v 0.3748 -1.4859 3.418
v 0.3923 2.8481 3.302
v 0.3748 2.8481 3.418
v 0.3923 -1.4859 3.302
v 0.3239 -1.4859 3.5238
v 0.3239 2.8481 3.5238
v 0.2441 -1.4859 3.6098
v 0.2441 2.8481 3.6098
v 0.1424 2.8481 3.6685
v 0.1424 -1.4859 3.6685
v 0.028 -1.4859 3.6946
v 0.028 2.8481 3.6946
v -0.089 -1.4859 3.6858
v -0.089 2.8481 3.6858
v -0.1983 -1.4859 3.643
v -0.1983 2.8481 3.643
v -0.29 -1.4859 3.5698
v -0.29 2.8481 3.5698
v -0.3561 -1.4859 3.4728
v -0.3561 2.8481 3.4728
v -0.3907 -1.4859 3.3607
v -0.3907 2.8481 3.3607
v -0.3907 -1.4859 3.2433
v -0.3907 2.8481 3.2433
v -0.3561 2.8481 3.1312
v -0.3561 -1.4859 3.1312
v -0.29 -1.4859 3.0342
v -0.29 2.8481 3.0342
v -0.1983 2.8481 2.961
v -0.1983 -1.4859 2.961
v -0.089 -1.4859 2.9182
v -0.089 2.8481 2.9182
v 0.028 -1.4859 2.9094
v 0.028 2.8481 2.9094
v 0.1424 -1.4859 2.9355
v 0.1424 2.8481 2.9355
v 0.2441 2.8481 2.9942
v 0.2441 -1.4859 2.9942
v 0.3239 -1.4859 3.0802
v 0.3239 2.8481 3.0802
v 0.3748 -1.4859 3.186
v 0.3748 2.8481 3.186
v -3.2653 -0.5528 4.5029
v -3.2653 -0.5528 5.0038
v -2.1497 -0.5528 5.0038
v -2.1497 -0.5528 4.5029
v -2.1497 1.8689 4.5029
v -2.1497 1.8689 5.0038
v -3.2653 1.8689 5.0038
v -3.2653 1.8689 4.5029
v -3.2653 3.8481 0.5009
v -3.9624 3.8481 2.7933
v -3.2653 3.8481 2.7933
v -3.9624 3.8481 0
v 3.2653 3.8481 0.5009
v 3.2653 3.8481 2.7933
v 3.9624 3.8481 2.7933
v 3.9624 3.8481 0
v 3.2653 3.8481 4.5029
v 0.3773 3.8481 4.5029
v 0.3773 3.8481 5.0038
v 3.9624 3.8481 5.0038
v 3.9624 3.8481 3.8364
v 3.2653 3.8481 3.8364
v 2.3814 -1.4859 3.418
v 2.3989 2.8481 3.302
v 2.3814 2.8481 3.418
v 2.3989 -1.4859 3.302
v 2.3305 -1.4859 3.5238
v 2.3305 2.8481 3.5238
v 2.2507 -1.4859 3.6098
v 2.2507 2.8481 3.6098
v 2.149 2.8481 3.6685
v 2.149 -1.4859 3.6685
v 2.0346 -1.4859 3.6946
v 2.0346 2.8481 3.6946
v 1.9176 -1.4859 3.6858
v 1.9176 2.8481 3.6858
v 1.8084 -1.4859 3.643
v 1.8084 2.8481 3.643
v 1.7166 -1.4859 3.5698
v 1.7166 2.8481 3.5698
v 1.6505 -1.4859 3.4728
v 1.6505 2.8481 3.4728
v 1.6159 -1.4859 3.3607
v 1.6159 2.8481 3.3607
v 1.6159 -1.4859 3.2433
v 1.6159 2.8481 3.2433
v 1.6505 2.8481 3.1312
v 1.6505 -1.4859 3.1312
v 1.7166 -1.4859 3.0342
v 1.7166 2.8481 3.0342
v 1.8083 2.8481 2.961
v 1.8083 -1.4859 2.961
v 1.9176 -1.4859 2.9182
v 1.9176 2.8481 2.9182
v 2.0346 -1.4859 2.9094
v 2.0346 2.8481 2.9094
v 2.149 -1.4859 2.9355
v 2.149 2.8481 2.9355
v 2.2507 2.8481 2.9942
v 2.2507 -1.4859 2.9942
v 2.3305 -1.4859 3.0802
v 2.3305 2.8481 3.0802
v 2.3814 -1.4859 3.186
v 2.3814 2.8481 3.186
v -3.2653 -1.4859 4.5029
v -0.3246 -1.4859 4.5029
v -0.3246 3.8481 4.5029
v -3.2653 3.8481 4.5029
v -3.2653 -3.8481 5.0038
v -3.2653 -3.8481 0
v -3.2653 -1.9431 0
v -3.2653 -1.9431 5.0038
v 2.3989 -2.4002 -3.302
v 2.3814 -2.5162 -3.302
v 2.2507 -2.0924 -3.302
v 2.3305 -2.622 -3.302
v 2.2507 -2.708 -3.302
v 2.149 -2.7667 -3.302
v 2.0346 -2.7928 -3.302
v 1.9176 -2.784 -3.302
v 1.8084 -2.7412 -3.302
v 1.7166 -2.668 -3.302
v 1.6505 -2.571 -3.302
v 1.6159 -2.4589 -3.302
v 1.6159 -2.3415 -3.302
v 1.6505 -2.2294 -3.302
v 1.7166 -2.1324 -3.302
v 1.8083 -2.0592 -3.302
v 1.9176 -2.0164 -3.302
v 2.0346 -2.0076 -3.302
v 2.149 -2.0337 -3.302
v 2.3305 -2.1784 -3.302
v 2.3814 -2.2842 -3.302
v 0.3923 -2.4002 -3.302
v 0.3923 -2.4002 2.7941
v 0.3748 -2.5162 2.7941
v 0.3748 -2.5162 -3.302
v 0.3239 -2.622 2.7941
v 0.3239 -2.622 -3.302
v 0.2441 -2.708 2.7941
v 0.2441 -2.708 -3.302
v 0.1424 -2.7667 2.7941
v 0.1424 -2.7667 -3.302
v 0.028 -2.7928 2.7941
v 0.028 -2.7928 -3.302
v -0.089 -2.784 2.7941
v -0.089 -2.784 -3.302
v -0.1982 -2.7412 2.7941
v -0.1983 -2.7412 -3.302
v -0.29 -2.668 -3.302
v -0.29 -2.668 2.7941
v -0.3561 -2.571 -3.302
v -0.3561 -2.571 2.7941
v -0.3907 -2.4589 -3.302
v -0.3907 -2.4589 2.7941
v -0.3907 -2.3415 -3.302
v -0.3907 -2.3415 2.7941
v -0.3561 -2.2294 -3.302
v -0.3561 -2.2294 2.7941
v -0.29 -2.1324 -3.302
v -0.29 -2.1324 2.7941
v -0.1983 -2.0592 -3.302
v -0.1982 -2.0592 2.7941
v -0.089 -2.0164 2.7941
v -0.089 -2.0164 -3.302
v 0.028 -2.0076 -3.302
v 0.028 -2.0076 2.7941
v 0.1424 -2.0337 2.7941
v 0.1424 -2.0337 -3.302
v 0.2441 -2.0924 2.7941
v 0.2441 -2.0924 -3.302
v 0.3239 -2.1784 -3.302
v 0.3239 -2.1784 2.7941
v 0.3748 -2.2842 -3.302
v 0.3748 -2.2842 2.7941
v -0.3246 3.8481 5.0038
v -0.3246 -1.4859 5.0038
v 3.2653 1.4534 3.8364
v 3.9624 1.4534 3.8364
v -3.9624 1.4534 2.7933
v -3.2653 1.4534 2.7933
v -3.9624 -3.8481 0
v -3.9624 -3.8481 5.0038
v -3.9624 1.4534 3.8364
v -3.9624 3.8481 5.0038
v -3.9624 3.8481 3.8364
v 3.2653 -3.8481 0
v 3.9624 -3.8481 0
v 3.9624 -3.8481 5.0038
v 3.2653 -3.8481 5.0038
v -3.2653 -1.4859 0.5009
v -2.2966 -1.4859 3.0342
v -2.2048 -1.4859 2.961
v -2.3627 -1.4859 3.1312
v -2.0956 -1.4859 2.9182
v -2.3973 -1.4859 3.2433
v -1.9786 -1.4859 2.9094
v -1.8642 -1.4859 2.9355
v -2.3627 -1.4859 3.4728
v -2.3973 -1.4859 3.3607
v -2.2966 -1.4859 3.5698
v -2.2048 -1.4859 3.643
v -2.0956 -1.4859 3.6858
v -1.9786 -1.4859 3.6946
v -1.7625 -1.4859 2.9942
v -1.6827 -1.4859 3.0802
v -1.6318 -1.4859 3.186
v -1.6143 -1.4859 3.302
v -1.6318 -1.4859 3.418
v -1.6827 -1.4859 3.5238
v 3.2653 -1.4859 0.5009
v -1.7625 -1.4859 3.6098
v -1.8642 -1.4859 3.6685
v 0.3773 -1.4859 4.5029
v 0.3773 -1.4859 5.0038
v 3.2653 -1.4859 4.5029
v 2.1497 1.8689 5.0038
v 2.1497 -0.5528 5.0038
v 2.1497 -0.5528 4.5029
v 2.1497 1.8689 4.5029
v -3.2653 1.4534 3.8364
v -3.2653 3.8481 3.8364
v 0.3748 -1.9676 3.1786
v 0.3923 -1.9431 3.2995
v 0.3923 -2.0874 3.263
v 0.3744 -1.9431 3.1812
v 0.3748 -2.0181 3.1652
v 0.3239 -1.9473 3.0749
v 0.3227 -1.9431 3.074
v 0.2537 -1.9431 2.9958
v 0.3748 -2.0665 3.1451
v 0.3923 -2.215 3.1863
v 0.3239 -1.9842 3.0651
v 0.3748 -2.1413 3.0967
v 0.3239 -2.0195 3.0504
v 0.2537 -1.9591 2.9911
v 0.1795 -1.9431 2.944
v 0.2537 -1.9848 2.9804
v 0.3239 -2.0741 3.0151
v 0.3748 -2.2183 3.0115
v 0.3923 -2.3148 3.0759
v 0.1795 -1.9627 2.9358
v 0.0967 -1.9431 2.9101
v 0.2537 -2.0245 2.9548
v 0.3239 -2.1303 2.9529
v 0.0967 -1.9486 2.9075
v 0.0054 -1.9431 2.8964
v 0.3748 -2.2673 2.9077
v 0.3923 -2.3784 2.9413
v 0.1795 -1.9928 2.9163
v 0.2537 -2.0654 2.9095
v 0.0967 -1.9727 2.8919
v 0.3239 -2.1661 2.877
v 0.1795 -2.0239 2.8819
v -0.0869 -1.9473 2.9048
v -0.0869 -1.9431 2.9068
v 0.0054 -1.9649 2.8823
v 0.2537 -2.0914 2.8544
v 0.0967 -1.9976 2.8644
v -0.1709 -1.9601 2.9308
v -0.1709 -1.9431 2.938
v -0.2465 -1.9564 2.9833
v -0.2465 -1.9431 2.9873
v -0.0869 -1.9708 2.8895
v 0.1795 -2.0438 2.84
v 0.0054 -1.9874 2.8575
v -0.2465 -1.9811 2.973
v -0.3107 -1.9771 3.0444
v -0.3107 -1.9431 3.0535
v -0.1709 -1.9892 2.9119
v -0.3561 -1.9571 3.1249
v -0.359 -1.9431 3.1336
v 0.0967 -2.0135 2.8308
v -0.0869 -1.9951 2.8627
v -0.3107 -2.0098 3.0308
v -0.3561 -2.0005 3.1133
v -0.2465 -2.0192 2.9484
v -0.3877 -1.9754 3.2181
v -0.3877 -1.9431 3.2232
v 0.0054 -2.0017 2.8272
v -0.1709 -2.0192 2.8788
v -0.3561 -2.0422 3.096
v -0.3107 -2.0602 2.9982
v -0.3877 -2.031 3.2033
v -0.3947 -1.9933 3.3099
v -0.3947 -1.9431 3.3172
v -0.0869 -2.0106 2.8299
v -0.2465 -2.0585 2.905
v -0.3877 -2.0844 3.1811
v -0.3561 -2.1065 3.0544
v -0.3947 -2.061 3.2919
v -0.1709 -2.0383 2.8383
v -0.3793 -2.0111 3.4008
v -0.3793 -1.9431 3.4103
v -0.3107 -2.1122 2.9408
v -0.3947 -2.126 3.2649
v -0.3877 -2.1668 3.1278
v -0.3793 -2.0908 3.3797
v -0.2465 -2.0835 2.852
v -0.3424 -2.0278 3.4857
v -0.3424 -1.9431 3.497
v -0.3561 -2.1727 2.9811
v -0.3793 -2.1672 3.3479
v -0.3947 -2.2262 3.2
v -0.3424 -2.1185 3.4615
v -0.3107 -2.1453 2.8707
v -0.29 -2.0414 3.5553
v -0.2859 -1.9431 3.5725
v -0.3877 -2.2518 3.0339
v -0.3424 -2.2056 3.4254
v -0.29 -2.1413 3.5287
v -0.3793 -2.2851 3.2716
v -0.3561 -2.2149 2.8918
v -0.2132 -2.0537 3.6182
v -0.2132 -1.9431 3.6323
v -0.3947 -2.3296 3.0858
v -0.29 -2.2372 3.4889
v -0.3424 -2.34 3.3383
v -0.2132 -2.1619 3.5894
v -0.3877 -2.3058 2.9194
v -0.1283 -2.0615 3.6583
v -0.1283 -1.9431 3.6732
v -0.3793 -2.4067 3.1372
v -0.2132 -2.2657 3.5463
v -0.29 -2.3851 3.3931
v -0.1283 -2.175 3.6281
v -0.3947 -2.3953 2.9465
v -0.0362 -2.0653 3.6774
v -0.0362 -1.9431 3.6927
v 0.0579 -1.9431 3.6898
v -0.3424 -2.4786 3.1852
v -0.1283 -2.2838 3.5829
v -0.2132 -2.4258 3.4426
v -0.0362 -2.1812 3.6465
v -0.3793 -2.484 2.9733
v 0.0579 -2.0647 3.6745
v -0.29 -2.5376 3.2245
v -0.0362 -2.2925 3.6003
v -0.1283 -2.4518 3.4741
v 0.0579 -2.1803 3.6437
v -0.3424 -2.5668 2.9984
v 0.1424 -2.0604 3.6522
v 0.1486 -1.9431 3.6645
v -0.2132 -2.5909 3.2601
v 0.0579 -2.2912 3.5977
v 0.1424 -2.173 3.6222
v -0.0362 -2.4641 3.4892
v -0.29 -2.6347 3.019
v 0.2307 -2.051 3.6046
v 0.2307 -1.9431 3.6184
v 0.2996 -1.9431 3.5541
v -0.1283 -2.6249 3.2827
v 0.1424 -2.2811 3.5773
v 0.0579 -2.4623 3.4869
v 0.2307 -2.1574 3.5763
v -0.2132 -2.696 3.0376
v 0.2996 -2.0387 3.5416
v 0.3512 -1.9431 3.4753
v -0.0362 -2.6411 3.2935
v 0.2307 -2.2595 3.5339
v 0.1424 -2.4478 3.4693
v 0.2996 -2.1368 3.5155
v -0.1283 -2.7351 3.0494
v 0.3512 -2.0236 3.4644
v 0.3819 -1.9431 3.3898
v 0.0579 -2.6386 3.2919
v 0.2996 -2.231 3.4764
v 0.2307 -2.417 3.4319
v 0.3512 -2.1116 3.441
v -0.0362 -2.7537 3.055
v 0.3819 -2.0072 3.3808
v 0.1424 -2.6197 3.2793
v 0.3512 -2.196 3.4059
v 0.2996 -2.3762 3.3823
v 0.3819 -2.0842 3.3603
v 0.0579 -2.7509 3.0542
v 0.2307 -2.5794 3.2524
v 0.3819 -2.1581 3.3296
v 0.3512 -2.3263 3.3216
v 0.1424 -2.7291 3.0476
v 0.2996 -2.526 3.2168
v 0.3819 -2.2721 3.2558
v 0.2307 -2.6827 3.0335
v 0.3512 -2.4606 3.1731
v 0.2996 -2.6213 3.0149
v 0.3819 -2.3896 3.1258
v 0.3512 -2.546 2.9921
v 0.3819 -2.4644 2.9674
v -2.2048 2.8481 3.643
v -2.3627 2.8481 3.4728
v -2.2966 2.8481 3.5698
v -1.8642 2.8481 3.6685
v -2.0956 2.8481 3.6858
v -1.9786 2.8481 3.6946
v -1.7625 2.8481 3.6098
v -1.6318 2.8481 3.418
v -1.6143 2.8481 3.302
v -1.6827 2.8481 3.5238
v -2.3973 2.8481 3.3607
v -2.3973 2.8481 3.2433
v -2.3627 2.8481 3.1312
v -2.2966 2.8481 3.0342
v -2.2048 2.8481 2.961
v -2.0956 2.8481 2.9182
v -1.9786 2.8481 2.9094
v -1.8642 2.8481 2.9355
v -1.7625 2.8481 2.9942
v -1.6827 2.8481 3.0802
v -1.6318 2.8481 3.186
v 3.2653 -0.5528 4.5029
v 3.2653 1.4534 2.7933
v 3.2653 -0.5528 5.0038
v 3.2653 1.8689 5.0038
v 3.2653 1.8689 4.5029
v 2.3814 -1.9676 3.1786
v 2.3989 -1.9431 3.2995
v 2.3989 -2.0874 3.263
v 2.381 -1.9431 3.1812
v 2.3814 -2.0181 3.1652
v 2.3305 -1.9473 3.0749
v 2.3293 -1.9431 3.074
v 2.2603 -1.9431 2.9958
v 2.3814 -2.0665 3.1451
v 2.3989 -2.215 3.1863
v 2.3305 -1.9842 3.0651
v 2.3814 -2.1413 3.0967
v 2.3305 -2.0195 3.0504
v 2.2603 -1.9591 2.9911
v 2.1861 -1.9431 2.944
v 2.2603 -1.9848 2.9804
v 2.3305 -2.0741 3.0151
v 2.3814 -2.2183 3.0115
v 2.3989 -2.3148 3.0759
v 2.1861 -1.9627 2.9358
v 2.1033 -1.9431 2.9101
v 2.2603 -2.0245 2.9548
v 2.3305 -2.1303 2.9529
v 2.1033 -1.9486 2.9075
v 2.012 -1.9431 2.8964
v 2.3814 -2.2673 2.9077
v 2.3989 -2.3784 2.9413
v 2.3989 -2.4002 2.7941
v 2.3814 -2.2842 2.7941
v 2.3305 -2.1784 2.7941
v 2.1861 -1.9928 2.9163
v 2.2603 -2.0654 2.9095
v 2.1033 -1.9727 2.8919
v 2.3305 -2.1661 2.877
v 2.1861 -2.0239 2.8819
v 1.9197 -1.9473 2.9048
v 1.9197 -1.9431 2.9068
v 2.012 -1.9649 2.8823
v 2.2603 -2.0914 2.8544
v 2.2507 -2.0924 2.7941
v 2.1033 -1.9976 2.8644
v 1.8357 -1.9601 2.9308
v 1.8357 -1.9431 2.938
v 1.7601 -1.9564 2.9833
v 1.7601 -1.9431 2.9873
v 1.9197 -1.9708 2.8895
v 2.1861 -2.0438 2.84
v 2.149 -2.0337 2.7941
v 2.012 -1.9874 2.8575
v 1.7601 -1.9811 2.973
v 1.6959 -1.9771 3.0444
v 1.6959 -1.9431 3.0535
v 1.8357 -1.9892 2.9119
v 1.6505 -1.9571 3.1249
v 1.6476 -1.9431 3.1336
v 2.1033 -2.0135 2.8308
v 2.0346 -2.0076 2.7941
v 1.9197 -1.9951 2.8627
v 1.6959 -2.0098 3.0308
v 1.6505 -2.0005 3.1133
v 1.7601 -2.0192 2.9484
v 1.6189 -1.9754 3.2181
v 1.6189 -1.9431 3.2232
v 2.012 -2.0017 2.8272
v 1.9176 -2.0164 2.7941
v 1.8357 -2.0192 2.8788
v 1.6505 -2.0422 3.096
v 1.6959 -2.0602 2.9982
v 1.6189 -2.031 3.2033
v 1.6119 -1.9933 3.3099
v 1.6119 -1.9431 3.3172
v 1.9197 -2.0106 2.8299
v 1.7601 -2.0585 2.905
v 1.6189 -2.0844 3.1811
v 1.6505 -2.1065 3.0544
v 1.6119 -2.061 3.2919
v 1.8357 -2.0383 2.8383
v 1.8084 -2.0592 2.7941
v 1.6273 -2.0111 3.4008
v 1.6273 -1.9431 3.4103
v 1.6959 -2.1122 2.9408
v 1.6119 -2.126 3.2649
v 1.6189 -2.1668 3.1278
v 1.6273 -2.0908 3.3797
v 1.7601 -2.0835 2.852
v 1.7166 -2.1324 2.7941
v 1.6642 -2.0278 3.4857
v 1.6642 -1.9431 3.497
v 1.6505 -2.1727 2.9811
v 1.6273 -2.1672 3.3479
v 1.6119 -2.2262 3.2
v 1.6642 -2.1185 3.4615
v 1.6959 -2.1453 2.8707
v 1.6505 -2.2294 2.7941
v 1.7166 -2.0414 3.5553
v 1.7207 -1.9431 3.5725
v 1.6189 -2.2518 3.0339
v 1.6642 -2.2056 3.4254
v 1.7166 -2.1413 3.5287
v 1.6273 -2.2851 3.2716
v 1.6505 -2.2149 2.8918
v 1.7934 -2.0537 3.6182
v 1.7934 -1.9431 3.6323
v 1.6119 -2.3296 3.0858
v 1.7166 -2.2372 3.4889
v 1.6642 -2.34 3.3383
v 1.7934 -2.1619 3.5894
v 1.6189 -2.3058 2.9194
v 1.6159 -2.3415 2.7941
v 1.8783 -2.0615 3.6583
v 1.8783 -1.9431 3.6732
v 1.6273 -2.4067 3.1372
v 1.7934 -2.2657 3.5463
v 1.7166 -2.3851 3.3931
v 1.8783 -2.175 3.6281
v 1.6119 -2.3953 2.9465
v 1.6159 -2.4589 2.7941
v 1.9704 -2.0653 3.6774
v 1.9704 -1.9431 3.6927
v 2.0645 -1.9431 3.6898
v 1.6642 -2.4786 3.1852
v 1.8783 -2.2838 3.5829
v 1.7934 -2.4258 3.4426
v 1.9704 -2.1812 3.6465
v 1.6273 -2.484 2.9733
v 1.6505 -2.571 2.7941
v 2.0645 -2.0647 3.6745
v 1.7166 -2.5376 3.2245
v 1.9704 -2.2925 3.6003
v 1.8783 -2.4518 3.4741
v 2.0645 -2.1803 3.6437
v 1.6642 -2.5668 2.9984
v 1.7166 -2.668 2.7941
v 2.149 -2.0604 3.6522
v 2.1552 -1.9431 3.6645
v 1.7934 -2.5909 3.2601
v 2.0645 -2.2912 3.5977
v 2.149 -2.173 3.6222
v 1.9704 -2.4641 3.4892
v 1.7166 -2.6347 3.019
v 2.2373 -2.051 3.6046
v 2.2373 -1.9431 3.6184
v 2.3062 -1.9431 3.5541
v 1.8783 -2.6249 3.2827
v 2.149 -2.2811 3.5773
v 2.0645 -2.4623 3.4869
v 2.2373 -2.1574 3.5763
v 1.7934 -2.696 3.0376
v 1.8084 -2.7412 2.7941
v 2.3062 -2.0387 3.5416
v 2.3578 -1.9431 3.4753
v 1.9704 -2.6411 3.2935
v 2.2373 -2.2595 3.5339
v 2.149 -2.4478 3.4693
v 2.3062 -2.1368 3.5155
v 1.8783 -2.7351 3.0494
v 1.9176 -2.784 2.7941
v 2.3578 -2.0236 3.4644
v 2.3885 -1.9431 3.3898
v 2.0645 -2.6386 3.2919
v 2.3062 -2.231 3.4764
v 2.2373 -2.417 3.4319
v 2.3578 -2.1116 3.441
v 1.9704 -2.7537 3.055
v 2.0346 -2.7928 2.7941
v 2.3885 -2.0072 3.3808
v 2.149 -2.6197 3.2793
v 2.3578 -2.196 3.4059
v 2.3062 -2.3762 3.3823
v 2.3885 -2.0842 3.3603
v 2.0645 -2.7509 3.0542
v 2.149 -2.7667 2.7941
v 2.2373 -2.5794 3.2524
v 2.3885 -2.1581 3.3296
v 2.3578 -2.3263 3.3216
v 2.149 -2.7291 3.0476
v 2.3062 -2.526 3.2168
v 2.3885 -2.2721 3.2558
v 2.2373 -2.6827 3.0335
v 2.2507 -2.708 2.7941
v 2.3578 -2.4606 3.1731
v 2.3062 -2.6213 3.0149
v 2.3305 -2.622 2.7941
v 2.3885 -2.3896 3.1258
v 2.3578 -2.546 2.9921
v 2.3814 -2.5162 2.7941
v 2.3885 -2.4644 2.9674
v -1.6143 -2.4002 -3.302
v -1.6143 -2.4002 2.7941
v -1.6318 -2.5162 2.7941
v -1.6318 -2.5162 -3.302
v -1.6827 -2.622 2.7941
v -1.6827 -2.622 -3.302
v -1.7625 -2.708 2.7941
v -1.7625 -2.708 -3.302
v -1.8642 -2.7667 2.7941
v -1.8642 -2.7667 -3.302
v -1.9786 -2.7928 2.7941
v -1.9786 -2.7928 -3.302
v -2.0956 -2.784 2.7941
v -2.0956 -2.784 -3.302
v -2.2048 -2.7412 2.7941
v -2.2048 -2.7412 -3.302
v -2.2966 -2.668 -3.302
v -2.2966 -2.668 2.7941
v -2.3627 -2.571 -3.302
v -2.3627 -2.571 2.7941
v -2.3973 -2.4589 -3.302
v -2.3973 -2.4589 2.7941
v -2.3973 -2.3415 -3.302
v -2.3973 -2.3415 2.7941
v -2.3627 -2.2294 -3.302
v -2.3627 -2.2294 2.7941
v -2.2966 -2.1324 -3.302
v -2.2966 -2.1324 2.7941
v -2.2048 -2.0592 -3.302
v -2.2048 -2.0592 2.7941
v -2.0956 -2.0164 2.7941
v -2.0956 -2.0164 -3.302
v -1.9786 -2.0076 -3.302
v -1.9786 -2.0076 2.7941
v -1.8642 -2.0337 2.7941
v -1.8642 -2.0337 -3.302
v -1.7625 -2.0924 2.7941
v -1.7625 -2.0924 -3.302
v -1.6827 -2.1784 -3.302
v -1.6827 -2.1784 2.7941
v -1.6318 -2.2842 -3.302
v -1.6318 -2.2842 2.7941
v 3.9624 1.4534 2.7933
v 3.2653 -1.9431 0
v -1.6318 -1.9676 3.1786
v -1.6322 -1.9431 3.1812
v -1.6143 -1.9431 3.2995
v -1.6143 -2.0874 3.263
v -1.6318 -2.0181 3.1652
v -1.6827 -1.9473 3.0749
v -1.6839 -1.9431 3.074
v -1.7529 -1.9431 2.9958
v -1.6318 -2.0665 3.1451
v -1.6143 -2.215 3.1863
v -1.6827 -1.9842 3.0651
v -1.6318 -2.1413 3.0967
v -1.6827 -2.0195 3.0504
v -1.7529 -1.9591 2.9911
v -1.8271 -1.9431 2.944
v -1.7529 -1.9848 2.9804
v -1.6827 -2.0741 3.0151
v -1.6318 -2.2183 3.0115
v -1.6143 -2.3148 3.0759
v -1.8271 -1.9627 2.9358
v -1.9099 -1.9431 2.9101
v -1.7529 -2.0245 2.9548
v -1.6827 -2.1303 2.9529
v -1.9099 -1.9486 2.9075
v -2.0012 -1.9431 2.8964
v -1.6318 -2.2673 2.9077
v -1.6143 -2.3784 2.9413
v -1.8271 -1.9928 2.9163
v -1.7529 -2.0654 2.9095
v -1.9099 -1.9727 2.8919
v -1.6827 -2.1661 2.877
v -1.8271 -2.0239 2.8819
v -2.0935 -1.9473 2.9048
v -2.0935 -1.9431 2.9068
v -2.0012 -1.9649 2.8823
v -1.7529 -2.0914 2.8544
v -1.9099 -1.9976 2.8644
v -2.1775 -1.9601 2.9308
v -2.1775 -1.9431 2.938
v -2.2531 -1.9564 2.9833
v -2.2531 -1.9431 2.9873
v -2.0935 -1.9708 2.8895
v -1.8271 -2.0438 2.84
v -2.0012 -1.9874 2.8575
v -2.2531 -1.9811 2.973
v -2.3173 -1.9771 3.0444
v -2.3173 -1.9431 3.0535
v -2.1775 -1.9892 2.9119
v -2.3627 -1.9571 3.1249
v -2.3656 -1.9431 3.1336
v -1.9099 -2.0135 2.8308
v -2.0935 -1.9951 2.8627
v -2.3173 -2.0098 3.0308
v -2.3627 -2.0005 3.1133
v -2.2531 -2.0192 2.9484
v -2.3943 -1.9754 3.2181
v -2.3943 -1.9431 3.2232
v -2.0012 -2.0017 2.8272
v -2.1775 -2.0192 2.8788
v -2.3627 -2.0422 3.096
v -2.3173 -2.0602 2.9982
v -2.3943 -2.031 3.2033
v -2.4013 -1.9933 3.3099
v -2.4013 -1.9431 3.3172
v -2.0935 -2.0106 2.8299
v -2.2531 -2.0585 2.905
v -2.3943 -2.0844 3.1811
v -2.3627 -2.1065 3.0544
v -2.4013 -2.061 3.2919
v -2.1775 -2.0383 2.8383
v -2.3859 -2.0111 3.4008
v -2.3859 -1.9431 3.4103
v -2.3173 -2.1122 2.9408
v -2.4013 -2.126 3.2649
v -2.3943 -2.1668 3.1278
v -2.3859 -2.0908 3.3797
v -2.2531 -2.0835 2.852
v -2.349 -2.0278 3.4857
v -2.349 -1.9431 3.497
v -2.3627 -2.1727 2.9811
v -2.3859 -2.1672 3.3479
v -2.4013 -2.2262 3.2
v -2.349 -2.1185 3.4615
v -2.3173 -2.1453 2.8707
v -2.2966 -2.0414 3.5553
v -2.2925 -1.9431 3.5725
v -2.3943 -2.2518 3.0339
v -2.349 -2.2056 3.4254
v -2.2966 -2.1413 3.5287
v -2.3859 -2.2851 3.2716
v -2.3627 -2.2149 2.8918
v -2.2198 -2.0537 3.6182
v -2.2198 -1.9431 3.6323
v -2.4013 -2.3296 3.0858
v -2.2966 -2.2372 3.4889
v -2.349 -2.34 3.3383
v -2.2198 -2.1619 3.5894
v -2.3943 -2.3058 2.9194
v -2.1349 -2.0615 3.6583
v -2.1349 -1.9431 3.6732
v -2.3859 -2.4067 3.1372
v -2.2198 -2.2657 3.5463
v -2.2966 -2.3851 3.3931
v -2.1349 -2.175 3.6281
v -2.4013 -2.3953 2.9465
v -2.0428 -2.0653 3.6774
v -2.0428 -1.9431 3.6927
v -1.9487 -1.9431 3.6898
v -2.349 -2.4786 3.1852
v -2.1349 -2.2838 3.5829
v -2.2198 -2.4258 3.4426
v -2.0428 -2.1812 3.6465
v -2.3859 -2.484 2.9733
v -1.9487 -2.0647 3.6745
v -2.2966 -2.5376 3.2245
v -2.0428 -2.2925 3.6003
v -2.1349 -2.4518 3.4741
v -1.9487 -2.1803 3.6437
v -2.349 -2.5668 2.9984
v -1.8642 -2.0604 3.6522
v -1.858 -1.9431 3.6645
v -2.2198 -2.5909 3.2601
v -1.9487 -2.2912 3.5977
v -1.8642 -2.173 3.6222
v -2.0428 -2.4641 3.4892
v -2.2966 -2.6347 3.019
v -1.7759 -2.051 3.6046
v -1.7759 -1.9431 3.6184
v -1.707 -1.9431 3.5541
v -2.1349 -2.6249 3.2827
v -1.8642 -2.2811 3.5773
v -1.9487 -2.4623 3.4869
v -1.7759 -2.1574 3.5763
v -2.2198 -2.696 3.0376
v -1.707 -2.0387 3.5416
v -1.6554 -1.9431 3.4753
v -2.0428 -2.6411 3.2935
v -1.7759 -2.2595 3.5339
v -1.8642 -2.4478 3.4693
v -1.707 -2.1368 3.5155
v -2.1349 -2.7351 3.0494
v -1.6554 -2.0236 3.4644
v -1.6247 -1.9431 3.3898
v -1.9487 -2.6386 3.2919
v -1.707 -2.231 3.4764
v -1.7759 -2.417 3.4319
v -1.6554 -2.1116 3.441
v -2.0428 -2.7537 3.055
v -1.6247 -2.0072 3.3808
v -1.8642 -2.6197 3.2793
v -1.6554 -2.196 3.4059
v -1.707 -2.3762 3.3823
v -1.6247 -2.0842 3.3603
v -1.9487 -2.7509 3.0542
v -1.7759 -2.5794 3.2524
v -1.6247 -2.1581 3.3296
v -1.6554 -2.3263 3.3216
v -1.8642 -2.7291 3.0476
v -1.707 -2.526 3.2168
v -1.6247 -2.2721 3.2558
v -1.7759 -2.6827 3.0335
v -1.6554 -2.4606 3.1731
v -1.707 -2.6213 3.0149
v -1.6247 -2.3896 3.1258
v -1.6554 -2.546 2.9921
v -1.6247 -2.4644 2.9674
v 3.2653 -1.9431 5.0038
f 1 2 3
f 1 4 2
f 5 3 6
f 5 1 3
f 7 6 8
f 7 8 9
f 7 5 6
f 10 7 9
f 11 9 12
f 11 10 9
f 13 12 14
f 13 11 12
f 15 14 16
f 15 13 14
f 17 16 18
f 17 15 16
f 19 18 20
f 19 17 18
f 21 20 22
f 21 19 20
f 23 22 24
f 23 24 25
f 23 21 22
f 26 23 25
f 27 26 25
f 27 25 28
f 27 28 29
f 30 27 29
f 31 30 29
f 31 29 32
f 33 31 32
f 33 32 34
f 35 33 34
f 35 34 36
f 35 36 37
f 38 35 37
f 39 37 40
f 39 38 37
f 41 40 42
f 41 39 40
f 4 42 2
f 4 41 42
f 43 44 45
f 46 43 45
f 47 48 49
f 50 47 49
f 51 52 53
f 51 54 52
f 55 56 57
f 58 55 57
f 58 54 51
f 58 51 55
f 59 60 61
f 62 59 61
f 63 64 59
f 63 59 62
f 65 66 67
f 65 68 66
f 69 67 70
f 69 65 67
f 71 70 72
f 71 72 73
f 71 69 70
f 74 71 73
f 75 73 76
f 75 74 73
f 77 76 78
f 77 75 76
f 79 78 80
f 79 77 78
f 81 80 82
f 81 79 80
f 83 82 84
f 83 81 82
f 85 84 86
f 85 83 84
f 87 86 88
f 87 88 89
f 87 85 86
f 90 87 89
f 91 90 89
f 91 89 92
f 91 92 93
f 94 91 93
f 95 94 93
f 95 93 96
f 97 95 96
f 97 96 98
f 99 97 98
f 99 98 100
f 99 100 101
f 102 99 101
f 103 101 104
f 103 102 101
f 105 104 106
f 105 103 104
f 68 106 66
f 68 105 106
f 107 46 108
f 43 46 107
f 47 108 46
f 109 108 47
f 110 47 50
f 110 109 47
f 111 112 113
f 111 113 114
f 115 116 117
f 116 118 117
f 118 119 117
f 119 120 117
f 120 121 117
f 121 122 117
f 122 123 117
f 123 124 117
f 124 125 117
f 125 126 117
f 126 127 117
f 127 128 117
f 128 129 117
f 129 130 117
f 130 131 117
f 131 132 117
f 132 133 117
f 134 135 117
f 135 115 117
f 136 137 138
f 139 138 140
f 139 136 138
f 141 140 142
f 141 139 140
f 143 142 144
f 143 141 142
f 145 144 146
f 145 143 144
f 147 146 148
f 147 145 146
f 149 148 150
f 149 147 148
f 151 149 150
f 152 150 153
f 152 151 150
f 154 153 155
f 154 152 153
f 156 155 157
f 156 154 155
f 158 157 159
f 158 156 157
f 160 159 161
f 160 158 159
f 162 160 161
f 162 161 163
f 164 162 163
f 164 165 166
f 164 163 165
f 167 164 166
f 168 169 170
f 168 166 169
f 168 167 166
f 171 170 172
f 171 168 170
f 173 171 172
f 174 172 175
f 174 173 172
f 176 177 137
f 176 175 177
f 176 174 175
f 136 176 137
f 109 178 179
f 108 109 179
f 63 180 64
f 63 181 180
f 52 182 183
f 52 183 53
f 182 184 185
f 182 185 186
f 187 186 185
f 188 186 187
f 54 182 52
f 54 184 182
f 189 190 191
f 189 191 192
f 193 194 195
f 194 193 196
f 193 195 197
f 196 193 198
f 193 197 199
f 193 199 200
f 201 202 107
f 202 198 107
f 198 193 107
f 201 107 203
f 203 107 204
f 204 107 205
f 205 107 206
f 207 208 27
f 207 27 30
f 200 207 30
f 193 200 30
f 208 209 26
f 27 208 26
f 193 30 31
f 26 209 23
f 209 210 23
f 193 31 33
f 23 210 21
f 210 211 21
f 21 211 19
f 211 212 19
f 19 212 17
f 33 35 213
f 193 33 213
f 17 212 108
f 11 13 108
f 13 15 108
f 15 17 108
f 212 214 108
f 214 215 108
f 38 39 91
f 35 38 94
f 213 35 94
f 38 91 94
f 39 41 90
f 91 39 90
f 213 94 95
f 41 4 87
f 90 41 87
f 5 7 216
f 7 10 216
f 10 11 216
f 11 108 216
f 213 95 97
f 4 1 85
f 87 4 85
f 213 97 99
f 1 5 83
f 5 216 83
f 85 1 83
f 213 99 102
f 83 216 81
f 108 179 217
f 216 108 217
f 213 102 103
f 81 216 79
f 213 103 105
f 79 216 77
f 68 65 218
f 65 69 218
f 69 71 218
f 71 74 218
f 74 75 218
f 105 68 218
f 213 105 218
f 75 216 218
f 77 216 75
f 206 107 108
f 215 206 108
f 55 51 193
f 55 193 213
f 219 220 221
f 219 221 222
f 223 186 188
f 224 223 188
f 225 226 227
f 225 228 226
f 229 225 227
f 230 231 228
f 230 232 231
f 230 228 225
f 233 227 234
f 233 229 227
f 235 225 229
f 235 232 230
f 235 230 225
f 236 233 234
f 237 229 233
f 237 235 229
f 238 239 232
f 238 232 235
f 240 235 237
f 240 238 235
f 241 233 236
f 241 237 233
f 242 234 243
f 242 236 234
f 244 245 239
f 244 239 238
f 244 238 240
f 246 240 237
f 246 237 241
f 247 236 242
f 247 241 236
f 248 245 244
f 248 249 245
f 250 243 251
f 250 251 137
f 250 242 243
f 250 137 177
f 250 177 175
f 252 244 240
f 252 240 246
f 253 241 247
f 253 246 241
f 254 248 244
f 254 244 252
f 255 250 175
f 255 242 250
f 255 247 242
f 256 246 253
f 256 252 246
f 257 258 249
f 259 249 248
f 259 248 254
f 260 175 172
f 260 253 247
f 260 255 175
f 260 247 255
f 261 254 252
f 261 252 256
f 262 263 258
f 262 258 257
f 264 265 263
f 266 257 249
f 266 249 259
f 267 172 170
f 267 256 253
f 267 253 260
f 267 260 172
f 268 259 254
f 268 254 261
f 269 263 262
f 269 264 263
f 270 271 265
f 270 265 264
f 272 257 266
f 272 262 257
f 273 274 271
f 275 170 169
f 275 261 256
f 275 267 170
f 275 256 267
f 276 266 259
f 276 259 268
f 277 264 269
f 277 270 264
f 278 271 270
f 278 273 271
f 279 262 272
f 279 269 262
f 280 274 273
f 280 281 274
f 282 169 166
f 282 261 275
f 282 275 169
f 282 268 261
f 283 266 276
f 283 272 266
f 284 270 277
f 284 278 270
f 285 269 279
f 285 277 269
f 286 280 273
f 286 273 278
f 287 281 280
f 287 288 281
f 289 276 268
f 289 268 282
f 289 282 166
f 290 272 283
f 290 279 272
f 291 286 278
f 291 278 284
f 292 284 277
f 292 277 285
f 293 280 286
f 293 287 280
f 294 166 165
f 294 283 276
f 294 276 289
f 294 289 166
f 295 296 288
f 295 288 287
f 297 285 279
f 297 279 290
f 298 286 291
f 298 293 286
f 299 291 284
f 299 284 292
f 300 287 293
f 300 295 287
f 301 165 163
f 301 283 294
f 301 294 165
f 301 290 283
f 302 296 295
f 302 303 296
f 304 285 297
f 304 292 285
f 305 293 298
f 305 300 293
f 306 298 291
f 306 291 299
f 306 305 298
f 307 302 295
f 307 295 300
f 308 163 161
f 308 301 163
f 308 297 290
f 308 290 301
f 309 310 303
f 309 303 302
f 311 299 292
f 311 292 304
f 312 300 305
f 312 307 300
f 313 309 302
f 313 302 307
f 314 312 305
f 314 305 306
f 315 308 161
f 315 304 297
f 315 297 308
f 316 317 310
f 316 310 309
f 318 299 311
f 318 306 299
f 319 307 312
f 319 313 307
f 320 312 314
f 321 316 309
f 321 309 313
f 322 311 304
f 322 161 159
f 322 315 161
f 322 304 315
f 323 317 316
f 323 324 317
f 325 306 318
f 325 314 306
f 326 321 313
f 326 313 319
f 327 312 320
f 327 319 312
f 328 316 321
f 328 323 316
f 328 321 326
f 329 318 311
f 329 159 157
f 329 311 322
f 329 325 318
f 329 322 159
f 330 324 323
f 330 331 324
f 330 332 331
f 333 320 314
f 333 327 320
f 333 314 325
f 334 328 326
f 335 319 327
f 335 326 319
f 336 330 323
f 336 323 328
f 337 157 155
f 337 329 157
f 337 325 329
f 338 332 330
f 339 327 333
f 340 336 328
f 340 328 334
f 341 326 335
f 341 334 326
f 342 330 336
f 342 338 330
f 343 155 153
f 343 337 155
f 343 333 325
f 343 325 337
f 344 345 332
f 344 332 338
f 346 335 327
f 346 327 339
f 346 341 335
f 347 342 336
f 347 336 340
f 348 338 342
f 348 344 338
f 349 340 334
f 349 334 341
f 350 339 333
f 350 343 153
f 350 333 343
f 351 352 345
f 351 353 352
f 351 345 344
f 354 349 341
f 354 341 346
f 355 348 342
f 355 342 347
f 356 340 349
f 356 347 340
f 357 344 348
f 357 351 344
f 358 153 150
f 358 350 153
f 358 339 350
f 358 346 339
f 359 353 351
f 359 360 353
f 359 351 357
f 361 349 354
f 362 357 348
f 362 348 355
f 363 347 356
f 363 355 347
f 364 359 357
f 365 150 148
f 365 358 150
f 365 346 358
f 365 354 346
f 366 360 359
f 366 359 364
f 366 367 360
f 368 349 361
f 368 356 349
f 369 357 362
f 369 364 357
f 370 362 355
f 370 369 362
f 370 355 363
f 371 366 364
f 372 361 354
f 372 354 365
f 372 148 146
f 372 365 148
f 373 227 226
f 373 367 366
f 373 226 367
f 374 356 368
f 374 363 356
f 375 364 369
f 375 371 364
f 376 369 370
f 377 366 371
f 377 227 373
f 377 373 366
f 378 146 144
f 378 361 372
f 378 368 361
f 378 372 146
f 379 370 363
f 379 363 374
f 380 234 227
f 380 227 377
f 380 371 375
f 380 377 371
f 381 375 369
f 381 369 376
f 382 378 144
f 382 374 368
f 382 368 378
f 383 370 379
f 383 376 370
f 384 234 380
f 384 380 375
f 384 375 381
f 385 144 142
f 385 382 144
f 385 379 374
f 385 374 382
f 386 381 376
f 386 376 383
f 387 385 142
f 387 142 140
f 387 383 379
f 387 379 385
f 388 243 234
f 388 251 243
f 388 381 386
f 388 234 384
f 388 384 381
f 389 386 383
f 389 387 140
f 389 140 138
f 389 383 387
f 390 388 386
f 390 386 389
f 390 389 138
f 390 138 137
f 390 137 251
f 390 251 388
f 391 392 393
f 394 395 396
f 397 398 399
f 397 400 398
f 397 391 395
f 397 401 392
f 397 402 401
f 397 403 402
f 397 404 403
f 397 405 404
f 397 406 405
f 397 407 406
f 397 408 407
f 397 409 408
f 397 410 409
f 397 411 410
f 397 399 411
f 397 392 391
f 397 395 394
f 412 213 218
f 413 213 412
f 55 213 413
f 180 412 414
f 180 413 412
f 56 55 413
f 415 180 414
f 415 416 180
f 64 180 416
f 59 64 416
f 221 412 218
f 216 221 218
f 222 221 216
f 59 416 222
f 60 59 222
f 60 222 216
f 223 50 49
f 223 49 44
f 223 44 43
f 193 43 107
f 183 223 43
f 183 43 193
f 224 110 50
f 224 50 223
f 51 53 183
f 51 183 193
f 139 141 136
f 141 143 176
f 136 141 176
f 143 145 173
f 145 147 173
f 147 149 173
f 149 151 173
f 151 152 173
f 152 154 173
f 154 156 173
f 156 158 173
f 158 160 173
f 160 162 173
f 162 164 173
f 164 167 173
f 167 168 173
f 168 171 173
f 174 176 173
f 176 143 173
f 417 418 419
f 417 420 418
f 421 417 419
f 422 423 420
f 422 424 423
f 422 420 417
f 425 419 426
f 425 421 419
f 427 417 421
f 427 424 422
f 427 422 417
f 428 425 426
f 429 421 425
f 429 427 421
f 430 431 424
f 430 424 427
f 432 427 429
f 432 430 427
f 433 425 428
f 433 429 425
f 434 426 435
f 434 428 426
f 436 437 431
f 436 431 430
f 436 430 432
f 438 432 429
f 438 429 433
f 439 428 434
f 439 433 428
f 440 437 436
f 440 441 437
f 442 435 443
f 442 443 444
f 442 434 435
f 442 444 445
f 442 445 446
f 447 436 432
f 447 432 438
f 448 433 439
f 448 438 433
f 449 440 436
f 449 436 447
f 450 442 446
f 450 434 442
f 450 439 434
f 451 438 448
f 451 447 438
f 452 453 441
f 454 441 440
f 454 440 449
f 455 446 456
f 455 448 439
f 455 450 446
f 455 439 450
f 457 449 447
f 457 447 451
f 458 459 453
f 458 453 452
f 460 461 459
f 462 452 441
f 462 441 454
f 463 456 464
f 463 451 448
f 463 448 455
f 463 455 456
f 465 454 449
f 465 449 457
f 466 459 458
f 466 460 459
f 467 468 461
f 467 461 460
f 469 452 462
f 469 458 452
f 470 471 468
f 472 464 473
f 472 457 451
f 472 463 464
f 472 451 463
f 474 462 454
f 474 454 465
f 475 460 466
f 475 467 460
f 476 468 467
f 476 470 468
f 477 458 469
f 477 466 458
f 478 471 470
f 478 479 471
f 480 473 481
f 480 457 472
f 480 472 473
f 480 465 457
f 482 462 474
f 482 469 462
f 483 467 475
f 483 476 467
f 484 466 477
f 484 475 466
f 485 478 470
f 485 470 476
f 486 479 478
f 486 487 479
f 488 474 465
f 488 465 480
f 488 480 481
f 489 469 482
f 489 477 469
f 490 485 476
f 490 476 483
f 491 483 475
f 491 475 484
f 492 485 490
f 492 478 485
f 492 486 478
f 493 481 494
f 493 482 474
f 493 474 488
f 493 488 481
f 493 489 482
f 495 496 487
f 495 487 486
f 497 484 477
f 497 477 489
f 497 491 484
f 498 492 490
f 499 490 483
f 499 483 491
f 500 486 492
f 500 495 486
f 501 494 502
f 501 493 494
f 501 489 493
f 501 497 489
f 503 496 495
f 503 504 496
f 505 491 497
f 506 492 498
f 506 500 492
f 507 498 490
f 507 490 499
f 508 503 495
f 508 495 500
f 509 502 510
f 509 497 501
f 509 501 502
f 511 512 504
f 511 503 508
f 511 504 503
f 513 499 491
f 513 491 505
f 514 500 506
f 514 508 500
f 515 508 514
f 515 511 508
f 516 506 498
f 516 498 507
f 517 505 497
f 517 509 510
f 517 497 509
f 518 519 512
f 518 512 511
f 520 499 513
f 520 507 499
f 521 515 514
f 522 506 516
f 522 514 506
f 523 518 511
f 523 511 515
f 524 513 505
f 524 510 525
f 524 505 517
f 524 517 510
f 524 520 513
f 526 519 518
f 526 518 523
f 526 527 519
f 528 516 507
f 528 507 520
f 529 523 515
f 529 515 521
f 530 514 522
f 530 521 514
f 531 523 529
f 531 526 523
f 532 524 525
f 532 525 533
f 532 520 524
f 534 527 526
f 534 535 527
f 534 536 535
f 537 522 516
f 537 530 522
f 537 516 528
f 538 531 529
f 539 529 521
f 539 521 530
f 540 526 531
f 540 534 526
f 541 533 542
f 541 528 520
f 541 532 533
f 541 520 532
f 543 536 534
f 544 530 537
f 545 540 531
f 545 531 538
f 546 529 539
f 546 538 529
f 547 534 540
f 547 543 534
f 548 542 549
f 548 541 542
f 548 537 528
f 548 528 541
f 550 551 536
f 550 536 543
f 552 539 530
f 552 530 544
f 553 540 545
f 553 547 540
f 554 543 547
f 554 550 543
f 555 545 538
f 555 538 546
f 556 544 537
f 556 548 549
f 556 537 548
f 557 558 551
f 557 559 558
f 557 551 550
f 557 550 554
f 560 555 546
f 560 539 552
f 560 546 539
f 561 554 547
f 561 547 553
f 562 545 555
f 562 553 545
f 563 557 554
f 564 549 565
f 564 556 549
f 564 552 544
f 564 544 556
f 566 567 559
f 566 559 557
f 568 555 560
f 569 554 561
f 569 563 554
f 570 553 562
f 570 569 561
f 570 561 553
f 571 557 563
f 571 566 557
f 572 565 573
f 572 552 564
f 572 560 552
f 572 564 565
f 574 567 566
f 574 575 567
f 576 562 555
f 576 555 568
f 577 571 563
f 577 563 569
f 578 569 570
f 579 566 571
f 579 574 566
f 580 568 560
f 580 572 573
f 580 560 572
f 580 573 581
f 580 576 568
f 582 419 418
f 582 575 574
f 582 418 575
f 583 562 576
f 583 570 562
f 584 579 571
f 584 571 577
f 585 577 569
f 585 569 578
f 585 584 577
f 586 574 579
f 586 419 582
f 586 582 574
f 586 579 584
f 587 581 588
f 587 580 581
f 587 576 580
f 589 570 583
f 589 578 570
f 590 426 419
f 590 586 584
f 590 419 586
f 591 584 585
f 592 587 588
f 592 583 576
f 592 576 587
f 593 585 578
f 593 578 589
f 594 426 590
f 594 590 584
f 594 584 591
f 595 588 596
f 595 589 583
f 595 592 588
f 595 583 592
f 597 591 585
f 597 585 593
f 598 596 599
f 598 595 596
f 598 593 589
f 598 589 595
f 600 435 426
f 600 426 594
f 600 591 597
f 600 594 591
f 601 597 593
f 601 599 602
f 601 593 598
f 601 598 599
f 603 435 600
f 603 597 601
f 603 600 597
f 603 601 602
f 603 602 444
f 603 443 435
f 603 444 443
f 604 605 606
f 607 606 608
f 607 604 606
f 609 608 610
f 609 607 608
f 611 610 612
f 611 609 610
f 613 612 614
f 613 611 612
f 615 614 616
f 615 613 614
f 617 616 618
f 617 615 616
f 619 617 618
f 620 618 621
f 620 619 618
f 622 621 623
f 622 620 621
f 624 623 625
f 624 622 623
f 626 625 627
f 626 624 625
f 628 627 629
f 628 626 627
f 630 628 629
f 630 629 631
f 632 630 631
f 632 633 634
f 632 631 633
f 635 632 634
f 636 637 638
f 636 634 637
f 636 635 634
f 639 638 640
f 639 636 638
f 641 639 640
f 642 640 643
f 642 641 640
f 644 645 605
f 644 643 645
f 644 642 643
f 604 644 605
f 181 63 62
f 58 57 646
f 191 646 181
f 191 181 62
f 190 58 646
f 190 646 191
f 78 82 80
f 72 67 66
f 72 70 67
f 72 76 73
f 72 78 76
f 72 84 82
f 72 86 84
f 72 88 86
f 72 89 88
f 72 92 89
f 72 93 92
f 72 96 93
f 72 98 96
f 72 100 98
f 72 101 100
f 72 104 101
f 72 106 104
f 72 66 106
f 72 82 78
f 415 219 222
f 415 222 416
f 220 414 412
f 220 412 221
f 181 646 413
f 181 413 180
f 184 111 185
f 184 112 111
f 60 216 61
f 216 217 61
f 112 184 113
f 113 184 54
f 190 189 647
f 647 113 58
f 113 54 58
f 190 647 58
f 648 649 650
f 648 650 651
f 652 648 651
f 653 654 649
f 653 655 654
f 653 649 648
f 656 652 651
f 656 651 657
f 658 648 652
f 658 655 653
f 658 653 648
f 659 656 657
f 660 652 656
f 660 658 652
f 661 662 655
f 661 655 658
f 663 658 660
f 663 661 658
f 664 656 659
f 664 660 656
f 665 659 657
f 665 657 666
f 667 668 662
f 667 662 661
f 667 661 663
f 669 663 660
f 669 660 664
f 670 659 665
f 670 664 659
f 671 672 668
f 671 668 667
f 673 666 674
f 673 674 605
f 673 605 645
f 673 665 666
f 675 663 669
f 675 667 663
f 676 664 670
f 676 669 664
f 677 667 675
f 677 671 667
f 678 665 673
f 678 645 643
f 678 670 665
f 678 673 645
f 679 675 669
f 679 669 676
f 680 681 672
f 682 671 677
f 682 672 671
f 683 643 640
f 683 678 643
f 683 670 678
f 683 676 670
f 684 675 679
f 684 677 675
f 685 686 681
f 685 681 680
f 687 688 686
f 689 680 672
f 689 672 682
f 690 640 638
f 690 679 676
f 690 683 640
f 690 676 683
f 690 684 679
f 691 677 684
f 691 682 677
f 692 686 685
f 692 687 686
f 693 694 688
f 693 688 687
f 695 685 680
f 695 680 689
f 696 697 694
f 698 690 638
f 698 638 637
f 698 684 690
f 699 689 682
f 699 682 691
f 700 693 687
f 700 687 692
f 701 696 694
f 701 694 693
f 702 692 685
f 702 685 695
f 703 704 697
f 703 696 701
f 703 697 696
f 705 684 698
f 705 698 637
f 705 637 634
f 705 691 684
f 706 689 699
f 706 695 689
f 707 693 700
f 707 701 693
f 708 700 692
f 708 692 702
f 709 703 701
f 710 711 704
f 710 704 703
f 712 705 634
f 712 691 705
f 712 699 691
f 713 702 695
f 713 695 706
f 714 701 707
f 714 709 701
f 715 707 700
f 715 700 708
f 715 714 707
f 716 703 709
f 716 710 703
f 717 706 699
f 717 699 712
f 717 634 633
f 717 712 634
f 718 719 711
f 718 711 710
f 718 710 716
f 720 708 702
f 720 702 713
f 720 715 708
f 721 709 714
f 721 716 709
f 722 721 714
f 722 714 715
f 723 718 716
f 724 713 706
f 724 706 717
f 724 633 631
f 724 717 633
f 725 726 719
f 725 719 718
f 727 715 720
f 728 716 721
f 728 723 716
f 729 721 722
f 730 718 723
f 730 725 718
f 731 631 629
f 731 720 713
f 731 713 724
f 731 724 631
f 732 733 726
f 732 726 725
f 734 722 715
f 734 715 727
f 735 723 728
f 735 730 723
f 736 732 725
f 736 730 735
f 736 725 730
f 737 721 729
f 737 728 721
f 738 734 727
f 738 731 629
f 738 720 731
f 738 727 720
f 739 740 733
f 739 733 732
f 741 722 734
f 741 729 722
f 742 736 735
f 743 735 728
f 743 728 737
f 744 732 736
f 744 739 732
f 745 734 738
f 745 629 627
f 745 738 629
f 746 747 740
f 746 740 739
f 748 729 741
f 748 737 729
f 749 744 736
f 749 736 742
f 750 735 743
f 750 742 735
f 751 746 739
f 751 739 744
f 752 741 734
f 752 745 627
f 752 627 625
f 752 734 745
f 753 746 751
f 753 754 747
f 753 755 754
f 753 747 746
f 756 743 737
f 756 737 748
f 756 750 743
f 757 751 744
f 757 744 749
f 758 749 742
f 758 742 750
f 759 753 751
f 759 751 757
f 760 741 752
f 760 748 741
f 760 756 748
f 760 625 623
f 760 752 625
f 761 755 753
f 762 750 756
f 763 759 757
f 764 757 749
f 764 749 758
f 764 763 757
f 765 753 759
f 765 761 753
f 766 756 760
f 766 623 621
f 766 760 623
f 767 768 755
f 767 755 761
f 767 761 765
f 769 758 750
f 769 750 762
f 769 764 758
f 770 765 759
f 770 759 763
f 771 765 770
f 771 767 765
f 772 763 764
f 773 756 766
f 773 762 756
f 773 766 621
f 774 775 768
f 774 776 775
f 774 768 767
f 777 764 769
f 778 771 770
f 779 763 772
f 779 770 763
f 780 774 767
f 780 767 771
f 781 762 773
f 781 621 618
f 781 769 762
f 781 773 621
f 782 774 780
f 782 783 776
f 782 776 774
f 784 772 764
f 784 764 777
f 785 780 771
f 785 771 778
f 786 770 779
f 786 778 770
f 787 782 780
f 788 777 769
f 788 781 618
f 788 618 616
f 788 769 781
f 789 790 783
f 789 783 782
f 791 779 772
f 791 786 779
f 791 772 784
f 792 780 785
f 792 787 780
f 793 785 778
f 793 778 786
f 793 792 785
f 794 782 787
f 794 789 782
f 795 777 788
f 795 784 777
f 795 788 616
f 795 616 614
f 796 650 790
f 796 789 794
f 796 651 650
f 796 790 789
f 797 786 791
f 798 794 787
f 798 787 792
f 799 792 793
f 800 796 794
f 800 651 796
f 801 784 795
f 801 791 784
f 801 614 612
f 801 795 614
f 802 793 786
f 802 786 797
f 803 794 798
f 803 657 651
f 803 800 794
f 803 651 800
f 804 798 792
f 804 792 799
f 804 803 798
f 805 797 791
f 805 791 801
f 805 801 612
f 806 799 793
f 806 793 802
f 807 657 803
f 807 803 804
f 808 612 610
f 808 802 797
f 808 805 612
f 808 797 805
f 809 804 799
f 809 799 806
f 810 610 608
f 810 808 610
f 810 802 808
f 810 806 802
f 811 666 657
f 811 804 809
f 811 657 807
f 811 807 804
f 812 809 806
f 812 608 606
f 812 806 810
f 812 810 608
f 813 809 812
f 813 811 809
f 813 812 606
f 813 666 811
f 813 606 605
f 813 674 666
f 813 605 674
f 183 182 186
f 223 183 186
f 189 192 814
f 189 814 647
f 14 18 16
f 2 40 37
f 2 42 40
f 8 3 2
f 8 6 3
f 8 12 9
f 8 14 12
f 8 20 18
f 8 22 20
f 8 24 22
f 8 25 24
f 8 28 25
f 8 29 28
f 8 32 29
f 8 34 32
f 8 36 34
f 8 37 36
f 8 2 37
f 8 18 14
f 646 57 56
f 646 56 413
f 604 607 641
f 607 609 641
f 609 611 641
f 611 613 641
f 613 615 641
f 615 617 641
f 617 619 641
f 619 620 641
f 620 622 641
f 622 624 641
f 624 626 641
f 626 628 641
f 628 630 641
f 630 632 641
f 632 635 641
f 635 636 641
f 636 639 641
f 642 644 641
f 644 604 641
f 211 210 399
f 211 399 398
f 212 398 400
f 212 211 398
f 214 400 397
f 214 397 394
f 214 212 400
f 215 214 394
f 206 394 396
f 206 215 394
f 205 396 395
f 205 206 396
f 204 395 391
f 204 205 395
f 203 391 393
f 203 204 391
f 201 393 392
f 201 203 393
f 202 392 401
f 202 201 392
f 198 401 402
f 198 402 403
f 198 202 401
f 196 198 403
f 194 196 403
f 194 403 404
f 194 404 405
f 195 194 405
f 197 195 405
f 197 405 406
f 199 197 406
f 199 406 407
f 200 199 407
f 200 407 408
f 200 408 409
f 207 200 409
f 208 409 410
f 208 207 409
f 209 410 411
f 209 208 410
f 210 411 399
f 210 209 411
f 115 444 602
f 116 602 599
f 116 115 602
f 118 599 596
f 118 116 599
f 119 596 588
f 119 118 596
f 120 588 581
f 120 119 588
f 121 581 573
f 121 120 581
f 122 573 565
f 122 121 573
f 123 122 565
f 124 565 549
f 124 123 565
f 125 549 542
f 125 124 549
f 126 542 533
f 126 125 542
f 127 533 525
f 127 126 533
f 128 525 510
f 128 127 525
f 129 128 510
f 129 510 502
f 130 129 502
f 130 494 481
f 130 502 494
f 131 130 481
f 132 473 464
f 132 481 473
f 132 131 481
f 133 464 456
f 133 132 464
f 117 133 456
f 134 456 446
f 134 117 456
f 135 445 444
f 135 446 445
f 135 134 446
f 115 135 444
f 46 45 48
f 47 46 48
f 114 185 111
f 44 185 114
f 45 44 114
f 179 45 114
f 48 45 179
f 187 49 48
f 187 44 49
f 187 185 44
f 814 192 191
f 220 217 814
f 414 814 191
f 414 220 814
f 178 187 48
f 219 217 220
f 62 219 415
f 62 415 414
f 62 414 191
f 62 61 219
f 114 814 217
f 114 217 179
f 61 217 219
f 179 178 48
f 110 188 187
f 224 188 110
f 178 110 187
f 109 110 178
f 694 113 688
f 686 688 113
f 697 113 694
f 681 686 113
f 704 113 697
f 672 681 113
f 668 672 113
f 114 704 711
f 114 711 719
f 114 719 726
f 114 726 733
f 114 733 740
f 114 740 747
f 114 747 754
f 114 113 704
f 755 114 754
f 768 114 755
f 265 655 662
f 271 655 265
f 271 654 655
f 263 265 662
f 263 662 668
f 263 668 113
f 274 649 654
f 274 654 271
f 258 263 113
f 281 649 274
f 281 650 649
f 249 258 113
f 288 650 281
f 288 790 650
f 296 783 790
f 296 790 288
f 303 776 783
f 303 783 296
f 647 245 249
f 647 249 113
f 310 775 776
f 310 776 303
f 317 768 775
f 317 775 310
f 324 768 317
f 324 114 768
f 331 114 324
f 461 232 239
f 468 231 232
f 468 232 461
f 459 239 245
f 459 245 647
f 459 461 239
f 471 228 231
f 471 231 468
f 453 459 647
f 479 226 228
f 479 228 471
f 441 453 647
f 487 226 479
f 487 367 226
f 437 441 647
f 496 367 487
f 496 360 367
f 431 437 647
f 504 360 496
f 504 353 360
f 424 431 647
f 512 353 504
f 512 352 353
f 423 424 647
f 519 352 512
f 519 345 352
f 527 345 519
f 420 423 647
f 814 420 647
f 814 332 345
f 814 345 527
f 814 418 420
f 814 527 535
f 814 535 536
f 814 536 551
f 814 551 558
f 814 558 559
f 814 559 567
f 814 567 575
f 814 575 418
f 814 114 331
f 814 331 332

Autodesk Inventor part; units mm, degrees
ref_plane "YZ Plane" through (0, 0, 0) normal (1, 0, 0) x (0, 1, 0)
ref_plane "XZ Plane" through (0, 0, 0) normal (0, 1, 0) x (-1, 0, 0)
sketch "Sketch1" plane through (0, 0, 0) normal (0, 0, 1) x (1, 0, 0)
  line L0 (-3.9624, 3.8481) -> (3.9624, 3.8481)
  line L1 (3.9624, 3.8481) -> (3.9624, -3.8481)
  line L2 (3.9624, -3.8481) -> (-3.9624, -3.8481)
  line L3 (-3.9624, -3.8481) -> (-3.9624, 3.8481)
  line L4 (-3.9624, 3.8481) -> (3.9624, -3.8481) construction
  line L5 (3.9624, 3.8481) -> (-3.9624, -3.8481) construction
  point P0 (0, 0)
  dimension "d0" = 7.6962
  dimension "d1" = 7.9248
extrude "Extrusion1" add sketch "Sketch1" along normal blind 5.0038
sketch "Sketch4" plane through (-3.9624, 3.8481, 0) normal (0, 1, 0) x (1, 0, 0)
  line L0 (7.2277, -4.5029) -> (0.6971, -4.5029)
  line L1 (0.6971, -4.5029) -> (0.6971, -0.5009)
  line L2 (0.6971, -0.5009) -> (7.2277, -0.5009)
  line L3 (7.2277, -0.5009) -> (7.2277, -4.5029)
  line L4 (7.2277, -4.5029) -> (0.6971, -0.5009) construction
  line L5 (0.6971, -4.5029) -> (7.2277, -0.5009) construction
  line L6 (7.9248, -5.0038) -> (0, -5.0038) projected
  point P0 (3.9624, 0)
  point P1 (3.9624, -2.5019)
  dimension "d16" = 2.5019
extrude "Extrusion3" cut sketch "Sketch4" against normal blind 5.334
sketch "Sketch5" plane through (-3.9624, -3.8481, 0) normal (0, -1, 0) x (1, 0, 0)
  line L0 (7.9248, 5.0038) -> (0, 5.0038) projected
  line L1 (7.9248, 0) -> (0, 0) projected
  line L2 (0.6971, 5.0038) -> (7.2277, 5.0038)
  line L3 (7.2277, 5.0038) -> (7.2277, 0)
  line L4 (7.2277, 0) -> (0.6971, 0)
  line L5 (0.6971, 0) -> (0.6971, 5.0038)
  point P0 (3.9624, 0)
  point P1 (0.6971, 4.5029)
  point P2 (7.2277, 0.5009)
extrude "Extrusion4" cut sketch "Sketch5" against normal blind 1.905
sketch "Sketch9" plane through (0, 0, 5.0038) normal (0, 0, 1) x (1, 0, 0)
  line L0 (3.2653, 3.8481) -> (-3.2653, 3.8481) projected
  line L1 (-3.2653, -1.4859) -> (3.2653, -1.4859) projected
  line L2 (0.3773, 3.8481) -> (-0.3246, 3.8481)
  line L3 (-0.3246, 3.8481) -> (-0.3246, -1.4859)
  line L4 (-0.3246, -1.4859) -> (0.3773, -1.4859)
  line L5 (0.3773, -1.4859) -> (0.3773, 3.8481)
  line L6 (3.2653, 3.8481) -> (3.2653, -1.4859) projected
  line L7 (3.2653, -0.5528) -> (2.1497, -0.5528)
  line L8 (2.1497, -0.5528) -> (2.1497, 1.8689)
  line L9 (2.1497, 1.8689) -> (3.2653, 1.8689)
  line L10 (3.2653, 1.8689) -> (3.2653, -0.5528)
  line L11 (-3.2653, 3.8481) -> (-3.2653, -1.4859) projected
  line L12 (-3.2653, -0.5528) -> (-2.1497, -0.5528)
  line L13 (-2.1497, -0.5528) -> (-2.1497, 1.8689)
  line L14 (-2.1497, 1.8689) -> (-3.2653, 1.8689)
  line L15 (-3.2653, 1.8689) -> (-3.2653, -0.5528)
  point P0 (0, 0)
  dimension "d36" = 1.1156
  dimension "d37" = 1.1156
extrude "Extrusion7" cut sketch "Sketch9" against normal up to surface (0.5009 mm away) contours L5 L1 L3 L0 | L6 L7 L8 L9 | L14 L13 L12 L11
sketch "Sketch10" plane through (-3.9624, -1.4859, 0) normal (0, 1, 0) x (1, 0, 0)
  circle A0 centre (3.961, -3.302) radius 0.3937
  line L0 (7.9248, -5.0038) -> (4.3397, -5.0038) projected
  line L1 (0.6971, -4.5029) -> (0.6971, -0.5009) projected
  circle A1 centre (1.9544, -3.302) radius 0.3937
  line L2 (3.6378, -5.0038) -> (0, -5.0038) projected
  circle A2 centre (5.9676, -3.302) radius 0.3937
  point P0 (3.9624, 0)
  dimension "d40" = 1.7018
  dimension "d41" = 0.7874
  dimension "d42" = 3.2639
  dimension "d43" = 0.7874
  dimension "d44" = 1.7018
  dimension "d45" = 2.0066
  dimension "d46" = 0.7874
  dimension "d47" = 1.7018
  dimension "d48" = 2.0066
ref_plane "Work Plane1" through (-0.0014, -1.4859, 3.302) normal (-1, 0, 0) x (0, 0, 1)
sketch "Sketch11" plane through (-0.0014, -1.4859, 3.302) normal (-1, 0, 0) x (0, 0, 1)
  line L0 (-2.8011, 0) -> (1.2009, 0) projected
  line L1 (0.0001, 0) -> (0.0001, 4.334)
  line L2 (-2.8011, 5.334) -> (1.2009, 5.334) projected
  line L3 (-4.4984, -0.9144) -> (-6.604, -0.9144)
  line L4 (-3.302, -2.3622) -> (-3.302, 5.334) projected
  line L5 (-3.302, 5.334) -> (1.7018, 5.334) projected
  line L6 (-3.302, -0.9144) -> (-4.4984, -0.9144)
  line L7 (-3.302, -0.9144) -> (-0.5079, -0.9144)
  line L8 (0.0001, -0.4064) -> (0.0001, 0)
  arc A0 (-0.5079, -0.9144) -> (0.0001, -0.4064) centre (-0.5079, -0.4064) ccw
  point P0 (-3.302, 1.4859)
  dimension "d49" = 1
  dimension "d50" = 3.302
  dimension "d51" = 6.2484
  dimension "d52" = 0.508
sweep "Sweep1" add profiles "Sketch10" path "Sketch11" path curves L3 L6 L7 A0 L8 L1
sketch "Sketch12" plane through (3.9624, -3.8481, 0) normal (1, 0, 0) x (0, 0, -1)
  line L0 (-4.5029, 7.6962) -> (-0.5009, 7.6962) projected
  line L1 (-3.8364, 7.6962) -> (-2.7933, 7.6962)
  line L2 (-2.7933, 7.6962) -> (-2.7933, 5.3015)
  line L3 (-2.7933, 5.3015) -> (-3.8364, 5.3015)
  line L4 (-3.8364, 5.3015) -> (-3.8364, 7.6962)
  point P0 (0, 3.8481)
extrude "Extrusion8" cut sketch "Sketch12" against normal up to surface (0.6971 mm away)
sketch "Sketch13" plane through (-3.9624, -3.8481, 0) normal (-1, 0, 0) x (0, 0, 1)
  line L0 (3.8364, 7.6962) -> (4.5029, 7.6962) projected
  line L1 (2.7933, 5.3015) -> (2.7933, 7.6962) projected
  line L2 (3.8364, 7.6962) -> (2.7933, 7.6962)
  line L3 (2.7933, 7.6962) -> (2.7933, 5.3015)
  line L4 (2.7933, 5.3015) -> (3.8364, 5.3015)
  line L5 (3.8364, 5.3015) -> (3.8364, 7.6962)
  point P0 (0, 3.8481)
extrude "Extrusion9" cut sketch "Sketch13" against normal up to surface (0.6971 mm away)
equation "\"d37\" = d36"
equation "\"d44\" = d40"
equation "\"d47\" = d40"
equation "\"d48\" = d45"
properties part number "2SH-C-03-TR"
